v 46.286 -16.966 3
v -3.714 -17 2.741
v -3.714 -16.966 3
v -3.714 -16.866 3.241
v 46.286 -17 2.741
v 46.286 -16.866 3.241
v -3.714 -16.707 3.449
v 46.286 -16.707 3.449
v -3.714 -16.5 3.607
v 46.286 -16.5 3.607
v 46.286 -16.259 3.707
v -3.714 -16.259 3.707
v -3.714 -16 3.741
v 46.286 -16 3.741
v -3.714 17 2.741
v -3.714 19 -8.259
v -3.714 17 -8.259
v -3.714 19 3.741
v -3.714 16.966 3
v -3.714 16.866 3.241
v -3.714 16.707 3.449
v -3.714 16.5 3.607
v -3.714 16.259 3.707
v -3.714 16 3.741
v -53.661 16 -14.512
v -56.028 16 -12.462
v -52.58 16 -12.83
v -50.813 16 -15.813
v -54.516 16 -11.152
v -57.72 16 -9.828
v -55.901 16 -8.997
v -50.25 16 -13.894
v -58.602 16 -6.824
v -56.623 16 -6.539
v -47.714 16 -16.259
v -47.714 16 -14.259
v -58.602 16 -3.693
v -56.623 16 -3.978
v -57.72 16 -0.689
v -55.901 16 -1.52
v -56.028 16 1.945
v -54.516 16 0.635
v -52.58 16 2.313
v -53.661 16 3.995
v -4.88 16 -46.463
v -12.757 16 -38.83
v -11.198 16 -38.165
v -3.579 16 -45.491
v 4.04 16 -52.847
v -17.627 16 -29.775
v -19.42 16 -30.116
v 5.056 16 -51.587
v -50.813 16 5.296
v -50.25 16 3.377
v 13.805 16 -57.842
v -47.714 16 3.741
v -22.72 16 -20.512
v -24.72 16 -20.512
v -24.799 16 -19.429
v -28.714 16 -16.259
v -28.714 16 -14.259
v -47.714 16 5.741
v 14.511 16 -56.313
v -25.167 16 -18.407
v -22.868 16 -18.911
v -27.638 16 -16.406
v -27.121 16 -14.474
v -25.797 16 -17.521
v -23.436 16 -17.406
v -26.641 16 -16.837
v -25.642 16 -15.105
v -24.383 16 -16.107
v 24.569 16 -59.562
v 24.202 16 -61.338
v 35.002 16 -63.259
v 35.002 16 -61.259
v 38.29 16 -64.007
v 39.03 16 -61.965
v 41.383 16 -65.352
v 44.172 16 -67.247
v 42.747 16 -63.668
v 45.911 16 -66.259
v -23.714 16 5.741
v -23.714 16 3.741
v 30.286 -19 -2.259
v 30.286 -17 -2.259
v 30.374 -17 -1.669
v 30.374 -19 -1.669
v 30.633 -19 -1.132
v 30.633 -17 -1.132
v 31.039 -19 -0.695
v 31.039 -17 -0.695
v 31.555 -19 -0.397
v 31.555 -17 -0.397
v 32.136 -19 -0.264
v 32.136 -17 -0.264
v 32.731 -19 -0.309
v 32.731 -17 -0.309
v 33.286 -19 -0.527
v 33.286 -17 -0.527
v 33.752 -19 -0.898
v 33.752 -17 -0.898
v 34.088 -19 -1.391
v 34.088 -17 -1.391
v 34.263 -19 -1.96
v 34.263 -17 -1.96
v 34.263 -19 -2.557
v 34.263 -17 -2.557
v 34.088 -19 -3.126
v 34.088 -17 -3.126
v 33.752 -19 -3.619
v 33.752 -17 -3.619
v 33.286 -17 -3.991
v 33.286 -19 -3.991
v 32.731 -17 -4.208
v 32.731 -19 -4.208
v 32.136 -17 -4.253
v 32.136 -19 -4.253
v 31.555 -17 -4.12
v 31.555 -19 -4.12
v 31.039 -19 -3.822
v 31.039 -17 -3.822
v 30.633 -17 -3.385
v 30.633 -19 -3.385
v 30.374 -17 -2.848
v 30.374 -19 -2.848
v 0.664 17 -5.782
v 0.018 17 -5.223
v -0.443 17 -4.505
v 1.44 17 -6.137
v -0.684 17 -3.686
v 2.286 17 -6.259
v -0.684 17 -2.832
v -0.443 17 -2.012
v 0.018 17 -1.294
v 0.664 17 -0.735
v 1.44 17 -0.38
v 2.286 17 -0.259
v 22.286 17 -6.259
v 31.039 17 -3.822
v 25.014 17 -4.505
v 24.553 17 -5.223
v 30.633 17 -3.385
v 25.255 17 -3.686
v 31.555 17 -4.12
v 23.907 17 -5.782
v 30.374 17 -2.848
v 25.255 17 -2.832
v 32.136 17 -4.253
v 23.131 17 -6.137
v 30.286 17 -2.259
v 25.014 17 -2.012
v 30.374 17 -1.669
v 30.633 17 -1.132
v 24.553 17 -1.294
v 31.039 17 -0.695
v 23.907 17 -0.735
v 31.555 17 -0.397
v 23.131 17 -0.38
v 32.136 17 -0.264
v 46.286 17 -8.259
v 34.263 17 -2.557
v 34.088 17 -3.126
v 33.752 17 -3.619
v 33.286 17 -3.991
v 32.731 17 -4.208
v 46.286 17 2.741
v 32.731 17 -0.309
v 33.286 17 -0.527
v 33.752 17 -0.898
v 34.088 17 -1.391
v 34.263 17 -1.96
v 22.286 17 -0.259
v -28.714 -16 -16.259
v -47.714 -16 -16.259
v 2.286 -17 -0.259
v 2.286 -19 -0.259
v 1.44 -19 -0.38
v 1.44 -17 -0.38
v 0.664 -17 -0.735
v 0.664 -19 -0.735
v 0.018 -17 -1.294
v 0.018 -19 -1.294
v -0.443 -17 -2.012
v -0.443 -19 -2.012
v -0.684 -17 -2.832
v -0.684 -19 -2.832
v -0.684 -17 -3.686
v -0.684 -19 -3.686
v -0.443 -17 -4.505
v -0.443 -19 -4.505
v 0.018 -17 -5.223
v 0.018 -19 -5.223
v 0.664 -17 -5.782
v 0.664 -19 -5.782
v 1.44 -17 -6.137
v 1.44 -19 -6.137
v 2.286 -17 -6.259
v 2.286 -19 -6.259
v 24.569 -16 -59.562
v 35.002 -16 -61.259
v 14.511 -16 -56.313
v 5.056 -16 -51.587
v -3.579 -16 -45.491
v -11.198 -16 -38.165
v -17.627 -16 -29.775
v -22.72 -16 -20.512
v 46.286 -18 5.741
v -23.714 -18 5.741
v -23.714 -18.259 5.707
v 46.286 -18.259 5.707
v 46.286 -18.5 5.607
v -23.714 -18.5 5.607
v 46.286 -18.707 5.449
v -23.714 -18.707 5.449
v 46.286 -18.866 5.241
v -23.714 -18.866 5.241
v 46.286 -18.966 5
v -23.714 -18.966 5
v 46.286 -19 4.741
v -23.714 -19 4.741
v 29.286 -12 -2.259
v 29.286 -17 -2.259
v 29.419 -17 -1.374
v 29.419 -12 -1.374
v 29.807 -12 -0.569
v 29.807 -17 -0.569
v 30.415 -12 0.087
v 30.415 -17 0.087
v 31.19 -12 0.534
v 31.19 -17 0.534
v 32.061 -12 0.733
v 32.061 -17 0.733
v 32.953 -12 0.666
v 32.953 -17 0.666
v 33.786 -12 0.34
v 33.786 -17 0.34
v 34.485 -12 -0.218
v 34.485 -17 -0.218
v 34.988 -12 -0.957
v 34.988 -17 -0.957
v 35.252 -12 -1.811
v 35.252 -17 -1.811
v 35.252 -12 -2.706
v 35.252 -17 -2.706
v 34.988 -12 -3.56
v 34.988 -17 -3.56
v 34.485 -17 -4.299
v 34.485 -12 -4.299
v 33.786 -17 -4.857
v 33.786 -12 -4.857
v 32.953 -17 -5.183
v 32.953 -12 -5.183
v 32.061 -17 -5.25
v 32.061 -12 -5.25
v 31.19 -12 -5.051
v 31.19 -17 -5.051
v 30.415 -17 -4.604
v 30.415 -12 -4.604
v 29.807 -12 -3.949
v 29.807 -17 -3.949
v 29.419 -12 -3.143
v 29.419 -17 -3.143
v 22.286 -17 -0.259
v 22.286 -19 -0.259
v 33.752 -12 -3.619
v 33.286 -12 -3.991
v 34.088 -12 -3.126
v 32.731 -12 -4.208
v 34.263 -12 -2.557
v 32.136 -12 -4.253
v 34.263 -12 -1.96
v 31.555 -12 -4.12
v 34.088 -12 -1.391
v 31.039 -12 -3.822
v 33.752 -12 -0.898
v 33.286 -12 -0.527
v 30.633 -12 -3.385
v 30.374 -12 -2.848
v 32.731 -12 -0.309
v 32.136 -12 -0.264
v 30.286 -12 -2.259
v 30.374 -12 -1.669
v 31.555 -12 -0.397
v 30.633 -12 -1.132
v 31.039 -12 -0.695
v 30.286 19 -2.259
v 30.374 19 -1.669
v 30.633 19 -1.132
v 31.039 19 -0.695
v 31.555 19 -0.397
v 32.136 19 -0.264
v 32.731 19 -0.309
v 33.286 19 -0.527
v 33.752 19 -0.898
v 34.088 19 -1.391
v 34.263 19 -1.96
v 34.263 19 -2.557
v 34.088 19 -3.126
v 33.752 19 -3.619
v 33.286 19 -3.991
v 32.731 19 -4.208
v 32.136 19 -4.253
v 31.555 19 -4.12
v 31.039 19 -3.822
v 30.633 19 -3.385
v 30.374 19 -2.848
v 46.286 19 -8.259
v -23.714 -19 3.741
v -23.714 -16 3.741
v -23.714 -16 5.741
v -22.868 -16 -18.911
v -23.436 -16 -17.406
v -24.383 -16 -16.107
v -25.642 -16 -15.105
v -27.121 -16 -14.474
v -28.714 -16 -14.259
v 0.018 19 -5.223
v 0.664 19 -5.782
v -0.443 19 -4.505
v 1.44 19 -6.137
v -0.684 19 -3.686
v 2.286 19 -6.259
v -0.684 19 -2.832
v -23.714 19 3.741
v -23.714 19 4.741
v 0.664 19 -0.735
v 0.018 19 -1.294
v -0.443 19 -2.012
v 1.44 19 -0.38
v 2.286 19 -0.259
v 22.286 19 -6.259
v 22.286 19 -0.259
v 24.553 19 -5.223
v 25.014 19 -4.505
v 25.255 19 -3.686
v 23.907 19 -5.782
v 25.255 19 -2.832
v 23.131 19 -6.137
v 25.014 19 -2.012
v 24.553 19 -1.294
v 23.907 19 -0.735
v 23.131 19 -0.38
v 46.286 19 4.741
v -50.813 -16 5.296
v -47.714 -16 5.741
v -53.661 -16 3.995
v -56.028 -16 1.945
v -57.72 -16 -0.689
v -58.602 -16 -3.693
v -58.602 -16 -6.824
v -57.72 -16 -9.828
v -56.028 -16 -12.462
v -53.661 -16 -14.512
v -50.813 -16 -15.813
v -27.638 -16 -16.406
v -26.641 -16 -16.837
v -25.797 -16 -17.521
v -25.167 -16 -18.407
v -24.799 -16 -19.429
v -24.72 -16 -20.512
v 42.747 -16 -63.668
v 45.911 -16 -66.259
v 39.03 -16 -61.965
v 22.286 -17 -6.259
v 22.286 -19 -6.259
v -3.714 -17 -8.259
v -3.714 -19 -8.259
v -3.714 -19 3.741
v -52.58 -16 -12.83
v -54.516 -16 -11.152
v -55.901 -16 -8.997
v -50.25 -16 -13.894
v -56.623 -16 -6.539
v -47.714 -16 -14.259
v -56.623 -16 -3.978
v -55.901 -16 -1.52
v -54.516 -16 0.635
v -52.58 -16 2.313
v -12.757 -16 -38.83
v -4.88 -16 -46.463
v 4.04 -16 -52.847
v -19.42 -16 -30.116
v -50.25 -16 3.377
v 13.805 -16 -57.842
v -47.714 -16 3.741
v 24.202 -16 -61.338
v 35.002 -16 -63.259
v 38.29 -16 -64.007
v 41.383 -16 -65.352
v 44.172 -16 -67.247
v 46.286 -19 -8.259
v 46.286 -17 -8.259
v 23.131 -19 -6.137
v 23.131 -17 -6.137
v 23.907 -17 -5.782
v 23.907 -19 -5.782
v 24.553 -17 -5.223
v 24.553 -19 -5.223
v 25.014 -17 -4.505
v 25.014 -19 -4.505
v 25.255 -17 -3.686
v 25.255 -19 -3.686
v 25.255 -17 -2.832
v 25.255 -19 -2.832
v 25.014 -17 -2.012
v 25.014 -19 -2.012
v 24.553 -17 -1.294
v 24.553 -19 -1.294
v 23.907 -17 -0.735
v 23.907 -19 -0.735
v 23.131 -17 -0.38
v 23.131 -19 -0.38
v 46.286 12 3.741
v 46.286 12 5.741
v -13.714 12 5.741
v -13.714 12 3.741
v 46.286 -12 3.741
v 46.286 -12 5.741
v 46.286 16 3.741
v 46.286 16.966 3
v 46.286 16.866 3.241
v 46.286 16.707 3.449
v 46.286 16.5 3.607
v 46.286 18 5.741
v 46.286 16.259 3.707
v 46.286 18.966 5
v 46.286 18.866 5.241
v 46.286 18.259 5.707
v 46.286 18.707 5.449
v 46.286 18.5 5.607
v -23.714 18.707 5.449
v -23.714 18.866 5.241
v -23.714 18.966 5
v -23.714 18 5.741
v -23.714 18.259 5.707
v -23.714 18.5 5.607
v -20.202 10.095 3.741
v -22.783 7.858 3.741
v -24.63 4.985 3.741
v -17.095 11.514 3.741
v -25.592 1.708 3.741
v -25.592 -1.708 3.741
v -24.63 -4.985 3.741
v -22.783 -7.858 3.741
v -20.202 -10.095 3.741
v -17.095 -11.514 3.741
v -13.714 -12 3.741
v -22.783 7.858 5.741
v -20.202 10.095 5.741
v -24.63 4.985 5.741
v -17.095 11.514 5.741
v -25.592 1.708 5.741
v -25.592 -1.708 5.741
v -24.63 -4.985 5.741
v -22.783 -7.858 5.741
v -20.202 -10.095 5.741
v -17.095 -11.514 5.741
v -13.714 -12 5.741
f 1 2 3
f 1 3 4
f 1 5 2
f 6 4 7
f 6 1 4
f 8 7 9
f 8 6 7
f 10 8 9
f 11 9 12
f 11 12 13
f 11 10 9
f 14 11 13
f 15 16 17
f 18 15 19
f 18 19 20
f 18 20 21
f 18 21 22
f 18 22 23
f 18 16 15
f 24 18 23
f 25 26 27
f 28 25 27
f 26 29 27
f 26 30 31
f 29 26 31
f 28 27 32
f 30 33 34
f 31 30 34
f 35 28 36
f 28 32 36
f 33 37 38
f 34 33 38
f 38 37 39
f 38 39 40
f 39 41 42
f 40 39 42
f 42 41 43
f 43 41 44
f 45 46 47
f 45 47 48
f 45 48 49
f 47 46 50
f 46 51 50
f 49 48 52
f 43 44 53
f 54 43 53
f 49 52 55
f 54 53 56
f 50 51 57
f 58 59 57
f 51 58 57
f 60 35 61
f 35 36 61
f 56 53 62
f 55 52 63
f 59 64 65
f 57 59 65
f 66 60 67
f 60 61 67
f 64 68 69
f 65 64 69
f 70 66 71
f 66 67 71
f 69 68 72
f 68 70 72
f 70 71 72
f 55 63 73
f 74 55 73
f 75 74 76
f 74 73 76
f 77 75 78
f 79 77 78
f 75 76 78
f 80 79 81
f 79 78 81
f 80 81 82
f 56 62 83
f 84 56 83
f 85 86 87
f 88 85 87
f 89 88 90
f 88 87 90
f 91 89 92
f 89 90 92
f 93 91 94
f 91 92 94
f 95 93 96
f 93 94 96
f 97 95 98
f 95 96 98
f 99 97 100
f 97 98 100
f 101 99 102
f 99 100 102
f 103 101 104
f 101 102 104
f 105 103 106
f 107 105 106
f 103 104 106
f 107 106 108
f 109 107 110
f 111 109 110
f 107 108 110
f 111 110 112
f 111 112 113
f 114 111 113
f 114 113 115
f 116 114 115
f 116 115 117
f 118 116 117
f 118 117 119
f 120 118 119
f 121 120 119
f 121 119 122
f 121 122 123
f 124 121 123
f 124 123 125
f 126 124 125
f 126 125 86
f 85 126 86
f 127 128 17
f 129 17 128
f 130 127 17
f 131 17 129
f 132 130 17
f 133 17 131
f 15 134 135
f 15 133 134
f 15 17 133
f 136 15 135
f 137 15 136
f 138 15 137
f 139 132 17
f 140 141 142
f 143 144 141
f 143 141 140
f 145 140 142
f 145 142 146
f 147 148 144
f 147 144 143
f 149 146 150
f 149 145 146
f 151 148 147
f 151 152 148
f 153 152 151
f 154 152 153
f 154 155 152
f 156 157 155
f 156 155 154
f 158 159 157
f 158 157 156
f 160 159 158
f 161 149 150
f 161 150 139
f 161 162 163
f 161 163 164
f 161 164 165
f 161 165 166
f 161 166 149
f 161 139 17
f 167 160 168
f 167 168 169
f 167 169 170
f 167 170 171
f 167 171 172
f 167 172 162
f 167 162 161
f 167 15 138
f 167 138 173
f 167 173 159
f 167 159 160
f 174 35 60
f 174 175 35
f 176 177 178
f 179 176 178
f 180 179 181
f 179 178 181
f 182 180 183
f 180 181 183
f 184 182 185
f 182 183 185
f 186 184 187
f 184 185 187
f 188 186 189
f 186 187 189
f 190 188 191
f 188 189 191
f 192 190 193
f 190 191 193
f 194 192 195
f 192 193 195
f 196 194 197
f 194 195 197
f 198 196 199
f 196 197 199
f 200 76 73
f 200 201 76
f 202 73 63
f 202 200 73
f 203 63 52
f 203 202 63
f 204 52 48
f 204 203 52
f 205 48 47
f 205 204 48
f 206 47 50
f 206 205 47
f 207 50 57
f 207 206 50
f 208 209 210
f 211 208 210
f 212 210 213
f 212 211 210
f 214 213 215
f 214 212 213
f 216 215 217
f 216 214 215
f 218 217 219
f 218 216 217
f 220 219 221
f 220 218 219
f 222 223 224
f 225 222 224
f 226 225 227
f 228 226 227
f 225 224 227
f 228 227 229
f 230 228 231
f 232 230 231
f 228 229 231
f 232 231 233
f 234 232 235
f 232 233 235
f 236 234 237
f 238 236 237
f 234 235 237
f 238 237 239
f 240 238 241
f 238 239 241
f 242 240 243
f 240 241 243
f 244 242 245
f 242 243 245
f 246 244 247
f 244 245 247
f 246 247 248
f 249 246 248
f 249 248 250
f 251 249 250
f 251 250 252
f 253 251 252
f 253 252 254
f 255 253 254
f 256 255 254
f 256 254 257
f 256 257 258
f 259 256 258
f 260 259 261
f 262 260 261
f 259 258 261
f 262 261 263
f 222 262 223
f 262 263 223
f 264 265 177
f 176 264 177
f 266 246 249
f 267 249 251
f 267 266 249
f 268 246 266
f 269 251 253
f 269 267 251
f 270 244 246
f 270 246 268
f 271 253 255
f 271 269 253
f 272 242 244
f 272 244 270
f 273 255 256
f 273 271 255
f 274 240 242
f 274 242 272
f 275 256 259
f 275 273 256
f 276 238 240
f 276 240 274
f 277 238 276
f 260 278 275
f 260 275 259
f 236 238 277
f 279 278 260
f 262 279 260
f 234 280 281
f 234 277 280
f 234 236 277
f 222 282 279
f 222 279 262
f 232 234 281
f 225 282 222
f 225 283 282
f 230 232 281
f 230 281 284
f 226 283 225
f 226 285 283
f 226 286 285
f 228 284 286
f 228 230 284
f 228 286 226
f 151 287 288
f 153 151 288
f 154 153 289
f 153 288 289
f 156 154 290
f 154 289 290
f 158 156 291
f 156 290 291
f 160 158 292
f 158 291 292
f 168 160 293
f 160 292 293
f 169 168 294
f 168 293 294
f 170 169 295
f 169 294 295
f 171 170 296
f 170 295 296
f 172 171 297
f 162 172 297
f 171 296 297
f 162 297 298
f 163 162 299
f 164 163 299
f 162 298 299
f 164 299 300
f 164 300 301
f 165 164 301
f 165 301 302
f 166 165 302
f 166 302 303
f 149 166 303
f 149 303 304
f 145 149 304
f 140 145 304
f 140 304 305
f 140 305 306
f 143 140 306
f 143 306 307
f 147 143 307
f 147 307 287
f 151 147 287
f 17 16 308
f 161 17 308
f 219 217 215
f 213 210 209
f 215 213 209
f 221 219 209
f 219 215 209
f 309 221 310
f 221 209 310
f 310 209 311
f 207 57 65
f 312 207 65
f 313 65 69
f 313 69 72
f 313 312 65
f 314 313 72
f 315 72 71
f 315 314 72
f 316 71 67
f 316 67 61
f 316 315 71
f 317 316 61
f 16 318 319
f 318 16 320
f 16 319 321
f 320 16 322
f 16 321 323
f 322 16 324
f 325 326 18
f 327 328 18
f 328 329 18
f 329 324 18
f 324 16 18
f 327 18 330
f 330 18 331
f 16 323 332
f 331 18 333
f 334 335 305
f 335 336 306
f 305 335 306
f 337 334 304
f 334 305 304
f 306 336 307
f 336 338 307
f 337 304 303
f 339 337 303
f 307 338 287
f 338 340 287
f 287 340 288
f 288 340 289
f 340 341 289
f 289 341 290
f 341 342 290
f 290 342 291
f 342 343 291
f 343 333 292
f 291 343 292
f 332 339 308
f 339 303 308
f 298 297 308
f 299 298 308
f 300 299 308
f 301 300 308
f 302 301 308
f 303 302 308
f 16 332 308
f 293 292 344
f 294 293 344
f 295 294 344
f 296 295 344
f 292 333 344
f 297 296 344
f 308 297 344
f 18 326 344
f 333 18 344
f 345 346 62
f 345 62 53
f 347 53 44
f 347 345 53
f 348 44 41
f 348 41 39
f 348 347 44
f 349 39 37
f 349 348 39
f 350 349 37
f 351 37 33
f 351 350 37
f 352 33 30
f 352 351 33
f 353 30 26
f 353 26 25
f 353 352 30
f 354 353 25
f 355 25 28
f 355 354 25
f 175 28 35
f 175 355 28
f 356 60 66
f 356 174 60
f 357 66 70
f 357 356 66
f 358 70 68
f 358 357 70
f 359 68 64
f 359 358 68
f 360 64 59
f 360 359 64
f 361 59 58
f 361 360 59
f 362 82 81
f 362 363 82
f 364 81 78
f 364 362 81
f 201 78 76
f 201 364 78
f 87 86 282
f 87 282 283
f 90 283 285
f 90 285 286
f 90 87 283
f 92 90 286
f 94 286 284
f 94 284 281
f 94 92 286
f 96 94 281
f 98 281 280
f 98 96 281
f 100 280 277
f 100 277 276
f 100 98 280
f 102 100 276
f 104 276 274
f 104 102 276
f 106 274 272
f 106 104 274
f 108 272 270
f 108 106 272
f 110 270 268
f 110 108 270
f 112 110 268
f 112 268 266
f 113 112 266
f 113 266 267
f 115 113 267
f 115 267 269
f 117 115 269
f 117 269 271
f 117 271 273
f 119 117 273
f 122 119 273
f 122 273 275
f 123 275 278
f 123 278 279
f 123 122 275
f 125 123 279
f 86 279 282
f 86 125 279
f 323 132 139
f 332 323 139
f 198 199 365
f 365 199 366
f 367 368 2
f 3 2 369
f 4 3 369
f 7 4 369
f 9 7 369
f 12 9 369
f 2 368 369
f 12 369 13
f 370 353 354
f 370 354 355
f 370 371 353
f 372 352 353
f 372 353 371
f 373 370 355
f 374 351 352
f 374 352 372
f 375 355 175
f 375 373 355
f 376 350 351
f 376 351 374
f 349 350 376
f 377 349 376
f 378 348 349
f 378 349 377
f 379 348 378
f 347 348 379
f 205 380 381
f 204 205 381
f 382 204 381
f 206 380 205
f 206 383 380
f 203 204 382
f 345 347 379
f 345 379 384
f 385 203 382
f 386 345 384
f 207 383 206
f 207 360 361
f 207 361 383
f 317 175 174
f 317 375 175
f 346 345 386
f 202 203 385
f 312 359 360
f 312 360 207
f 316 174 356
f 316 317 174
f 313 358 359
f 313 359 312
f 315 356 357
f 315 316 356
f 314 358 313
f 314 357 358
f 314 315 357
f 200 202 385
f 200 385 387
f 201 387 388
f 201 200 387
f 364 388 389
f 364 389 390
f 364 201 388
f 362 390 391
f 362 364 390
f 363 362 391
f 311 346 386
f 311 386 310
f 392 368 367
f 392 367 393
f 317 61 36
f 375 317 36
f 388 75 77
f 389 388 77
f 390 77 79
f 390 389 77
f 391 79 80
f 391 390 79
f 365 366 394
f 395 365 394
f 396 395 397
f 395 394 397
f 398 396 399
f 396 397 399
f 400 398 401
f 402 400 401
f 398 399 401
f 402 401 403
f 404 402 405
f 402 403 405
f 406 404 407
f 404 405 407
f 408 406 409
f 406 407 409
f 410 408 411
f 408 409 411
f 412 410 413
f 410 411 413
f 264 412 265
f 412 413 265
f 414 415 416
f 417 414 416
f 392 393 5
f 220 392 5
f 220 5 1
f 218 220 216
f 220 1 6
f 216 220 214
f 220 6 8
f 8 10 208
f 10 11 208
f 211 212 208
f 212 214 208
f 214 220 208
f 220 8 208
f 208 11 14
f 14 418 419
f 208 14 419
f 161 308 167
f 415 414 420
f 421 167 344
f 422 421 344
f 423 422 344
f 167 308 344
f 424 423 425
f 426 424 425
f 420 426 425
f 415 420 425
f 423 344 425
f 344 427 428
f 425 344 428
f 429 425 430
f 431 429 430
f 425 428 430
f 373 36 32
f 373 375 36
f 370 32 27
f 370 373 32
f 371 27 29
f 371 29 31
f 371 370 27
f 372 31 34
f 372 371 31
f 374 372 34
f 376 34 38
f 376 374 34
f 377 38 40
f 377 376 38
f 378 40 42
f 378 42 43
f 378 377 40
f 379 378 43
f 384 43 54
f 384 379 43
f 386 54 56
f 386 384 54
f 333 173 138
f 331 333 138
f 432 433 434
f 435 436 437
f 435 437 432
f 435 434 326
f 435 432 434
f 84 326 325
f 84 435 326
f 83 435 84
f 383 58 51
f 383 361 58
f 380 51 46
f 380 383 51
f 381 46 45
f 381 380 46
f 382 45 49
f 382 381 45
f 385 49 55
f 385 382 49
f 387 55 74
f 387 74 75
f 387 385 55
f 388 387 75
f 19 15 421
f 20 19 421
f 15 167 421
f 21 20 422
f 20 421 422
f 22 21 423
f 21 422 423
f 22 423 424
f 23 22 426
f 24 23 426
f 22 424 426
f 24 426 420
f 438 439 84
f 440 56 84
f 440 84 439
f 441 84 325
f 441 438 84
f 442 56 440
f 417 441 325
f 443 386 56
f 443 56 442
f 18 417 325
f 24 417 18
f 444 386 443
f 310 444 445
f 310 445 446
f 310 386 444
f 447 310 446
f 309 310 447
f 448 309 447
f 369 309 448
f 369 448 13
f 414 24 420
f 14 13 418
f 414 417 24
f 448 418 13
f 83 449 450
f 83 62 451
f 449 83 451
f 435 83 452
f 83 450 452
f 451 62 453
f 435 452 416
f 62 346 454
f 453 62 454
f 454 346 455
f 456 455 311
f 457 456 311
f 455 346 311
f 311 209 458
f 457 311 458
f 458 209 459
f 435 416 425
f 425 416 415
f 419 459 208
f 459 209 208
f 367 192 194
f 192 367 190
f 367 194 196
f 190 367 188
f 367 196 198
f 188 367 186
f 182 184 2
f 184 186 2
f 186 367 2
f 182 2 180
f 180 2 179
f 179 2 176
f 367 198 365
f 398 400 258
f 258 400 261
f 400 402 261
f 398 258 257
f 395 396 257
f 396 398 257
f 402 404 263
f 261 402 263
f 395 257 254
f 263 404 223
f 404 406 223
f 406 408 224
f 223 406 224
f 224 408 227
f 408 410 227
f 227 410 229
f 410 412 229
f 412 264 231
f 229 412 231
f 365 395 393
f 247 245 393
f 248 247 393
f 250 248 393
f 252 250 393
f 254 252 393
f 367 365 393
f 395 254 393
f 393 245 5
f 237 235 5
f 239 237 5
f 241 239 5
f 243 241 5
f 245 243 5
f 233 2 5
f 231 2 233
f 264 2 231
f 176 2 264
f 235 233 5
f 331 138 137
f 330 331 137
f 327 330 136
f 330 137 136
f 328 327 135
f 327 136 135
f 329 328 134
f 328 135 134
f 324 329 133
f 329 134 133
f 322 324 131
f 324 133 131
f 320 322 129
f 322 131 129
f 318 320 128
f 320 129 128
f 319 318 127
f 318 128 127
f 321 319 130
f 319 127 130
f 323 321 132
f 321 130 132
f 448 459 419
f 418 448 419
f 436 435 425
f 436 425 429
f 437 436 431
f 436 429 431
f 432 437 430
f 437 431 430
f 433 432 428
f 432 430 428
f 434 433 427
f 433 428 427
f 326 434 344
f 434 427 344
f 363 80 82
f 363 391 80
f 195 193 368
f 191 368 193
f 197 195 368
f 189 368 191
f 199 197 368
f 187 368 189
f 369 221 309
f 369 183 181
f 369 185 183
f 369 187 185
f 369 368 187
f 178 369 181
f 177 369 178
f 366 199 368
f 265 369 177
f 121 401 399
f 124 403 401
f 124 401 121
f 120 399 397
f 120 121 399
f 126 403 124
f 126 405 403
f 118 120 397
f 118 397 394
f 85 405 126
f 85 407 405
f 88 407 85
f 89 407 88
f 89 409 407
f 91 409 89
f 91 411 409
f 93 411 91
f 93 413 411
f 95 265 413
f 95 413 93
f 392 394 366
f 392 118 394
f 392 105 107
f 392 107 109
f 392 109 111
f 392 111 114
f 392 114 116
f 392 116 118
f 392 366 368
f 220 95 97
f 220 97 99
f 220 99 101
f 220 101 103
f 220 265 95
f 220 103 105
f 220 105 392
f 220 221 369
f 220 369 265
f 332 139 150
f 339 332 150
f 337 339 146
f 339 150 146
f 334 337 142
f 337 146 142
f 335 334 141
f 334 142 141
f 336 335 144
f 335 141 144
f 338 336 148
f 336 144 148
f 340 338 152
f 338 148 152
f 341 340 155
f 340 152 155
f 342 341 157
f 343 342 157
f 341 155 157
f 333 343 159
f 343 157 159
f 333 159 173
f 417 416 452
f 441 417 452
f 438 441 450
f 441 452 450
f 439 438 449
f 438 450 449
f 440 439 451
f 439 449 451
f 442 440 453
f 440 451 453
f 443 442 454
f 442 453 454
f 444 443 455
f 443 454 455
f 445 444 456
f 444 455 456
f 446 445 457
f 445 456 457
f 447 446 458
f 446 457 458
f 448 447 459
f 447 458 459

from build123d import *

# Parameters (mm, degrees)
F1_DEPTH  = 16
F2_W      = 70
F2_H      = 3
F3_DEPTH  = 2
F4_W      = 50
F4_H      = 12
F5_DEPTH  = 2
F6_R      = 1
F9_DEPTH  = 2
F11_DEPTH = 38.001
F13_D     = 4
F14_R     = 3
F14_R_2   = 2
F15_DEPTH = 5


with BuildPart() as f1:
    # F0 (on Front) → F1 (new body)
    with BuildSketch(Plane.XZ):
        with BuildLine():
            Line((46.2855722755, 5.7414249778), (-47.7144277245, 5.7414249778))
            ThreePointArc((-47.7144277245, 5.7414249778), (-58.7144277245, -5.2585750222), (-47.7144277245, -16.2585750222))
            Line((-47.7144277245, -16.2585750222), (-28.7144277245, -16.2585750222))
            ThreePointArc((-28.7144277245, -16.2585750222), (-25.7968307423, -17.5210599177), (-24.7197856057, -20.5120821569))
            ThreePointArc((-24.7197856057, -20.5120821569), (-0.5386319719, -49.8206199667), (35.0020481502, -63.2585750222))
            ThreePointArc((35.0020481502, -63.2585750222), (39.8678360266, -64.6074545818), (44.1721712505, -67.2471640366))
            Line((44.1721712505, -67.2471640366), (45.9107602648, -66.2585750222))
            ThreePointArc((45.9107602648, -66.2585750222), (40.9429054682, -62.6971545828), (35.0020481502, -61.2585750222))
            ThreePointArc((35.0020481502, -61.2585750222), (0.6230450398, -48.7022972109), (-22.7197856057, -20.5120821569))
            ThreePointArc((-22.7197856057, -20.5120821569), (-24.3830859689, -16.1065299122), (-28.7144277245, -14.2585750222))
            Line((-28.7144277245, -14.2585750222), (-47.7144277245, -14.2585750222))
            ThreePointArc((-47.7144277245, -14.2585750222), (-56.7144277245, -5.2585750222), (-47.7144277245, 3.7414249778))
            Line((-47.7144277245, 3.7414249778), (46.2855722755, 3.7414249778))
            Line((46.2855722755, 3.7414249778), (46.2855722755, 5.7414249778))
        make_face()
    extrude(amount=F1_DEPTH)

    # F2 (on face) → F3 (join)
    with BuildSketch(Plane.XY.offset(5.7414249778)):
        with Locations((11.2855722755, -17.5)):
            Rectangle(F2_W, F2_H)
    extrude(amount=-F3_DEPTH)

    # F4 (on face) → F5 (join)
    with BuildSketch(Plane.XZ.offset(19)):
        with Locations((21.2855722755, -2.2585750222)):
            Rectangle(F4_W, F4_H)
    extrude(amount=-F5_DEPTH)

    # F6
    f6_edges = [f1.edges().sort_by_distance(p)[0] for p in [
        (11.285572, -19, 5.741425),
        (21.285572, -17, 3.741425),
    ]]
    fillet(f6_edges, radius=F6_R)

    # F7: F1 across plane


with BuildPart() as f1_1:
    add(f1.part)
    add(f1.part.mirror(Plane.XZ))

    # F8 (on face) → F9 (cut)
    with BuildSketch(Plane.XY.offset(5.7414249778)):
        with BuildLine():
            Line((46.2855722755, 12), (-13.7144277245, 12))
            ThreePointArc((-13.7144277245, 12), (-25.7144277245, 0), (-13.7144277245, -12))
            Line((-13.7144277245, -12), (46.2855722755, -12))
            Line((46.2855722755, -12), (46.2855722755, 12))
        make_face()
    extrude(amount=-F9_DEPTH, mode=Mode.SUBTRACT)

    # F10 (on face) → F11 (cut, through all)
    with BuildSketch(Plane.XZ.offset(19)):
        with BuildLine():
            ThreePointArc((2.2855722755, -0.2585750222), (-0.7144277245, -3.2585750222), (2.2855722755, -6.2585750222))
            Line((2.2855722755, -6.2585750222), (22.2855722755, -6.2585750222))
            ThreePointArc((22.2855722755, -6.2585750222), (25.2855722755, -3.2585750222), (22.2855722755, -0.2585750222))
            Line((22.2855722755, -0.2585750222), (2.2855722755, -0.2585750222))
        make_face()
    extrude(amount=-F11_DEPTH, mode=Mode.SUBTRACT)

    # F13 (through all)
    with Locations(Plane.XZ.offset(19)):
        with Locations((32.2855722755, -2.2585750222)):
            Hole(F13_D / 2)

    # F14 (on face) → F15 (join)
    with BuildSketch(Plane(origin=(0, -17, 0), x_dir=(-1, 0, 0), z_dir=(0, 1, 0))):
        with Locations((-32.2855722755, -2.2585750222)):
            Circle(F14_R)
        with Locations((-32.2855722755, -2.2585750222)):
            Circle(F14_R_2, mode=Mode.SUBTRACT)
    extrude(amount=F15_DEPTH)


solid = f1_1.part
